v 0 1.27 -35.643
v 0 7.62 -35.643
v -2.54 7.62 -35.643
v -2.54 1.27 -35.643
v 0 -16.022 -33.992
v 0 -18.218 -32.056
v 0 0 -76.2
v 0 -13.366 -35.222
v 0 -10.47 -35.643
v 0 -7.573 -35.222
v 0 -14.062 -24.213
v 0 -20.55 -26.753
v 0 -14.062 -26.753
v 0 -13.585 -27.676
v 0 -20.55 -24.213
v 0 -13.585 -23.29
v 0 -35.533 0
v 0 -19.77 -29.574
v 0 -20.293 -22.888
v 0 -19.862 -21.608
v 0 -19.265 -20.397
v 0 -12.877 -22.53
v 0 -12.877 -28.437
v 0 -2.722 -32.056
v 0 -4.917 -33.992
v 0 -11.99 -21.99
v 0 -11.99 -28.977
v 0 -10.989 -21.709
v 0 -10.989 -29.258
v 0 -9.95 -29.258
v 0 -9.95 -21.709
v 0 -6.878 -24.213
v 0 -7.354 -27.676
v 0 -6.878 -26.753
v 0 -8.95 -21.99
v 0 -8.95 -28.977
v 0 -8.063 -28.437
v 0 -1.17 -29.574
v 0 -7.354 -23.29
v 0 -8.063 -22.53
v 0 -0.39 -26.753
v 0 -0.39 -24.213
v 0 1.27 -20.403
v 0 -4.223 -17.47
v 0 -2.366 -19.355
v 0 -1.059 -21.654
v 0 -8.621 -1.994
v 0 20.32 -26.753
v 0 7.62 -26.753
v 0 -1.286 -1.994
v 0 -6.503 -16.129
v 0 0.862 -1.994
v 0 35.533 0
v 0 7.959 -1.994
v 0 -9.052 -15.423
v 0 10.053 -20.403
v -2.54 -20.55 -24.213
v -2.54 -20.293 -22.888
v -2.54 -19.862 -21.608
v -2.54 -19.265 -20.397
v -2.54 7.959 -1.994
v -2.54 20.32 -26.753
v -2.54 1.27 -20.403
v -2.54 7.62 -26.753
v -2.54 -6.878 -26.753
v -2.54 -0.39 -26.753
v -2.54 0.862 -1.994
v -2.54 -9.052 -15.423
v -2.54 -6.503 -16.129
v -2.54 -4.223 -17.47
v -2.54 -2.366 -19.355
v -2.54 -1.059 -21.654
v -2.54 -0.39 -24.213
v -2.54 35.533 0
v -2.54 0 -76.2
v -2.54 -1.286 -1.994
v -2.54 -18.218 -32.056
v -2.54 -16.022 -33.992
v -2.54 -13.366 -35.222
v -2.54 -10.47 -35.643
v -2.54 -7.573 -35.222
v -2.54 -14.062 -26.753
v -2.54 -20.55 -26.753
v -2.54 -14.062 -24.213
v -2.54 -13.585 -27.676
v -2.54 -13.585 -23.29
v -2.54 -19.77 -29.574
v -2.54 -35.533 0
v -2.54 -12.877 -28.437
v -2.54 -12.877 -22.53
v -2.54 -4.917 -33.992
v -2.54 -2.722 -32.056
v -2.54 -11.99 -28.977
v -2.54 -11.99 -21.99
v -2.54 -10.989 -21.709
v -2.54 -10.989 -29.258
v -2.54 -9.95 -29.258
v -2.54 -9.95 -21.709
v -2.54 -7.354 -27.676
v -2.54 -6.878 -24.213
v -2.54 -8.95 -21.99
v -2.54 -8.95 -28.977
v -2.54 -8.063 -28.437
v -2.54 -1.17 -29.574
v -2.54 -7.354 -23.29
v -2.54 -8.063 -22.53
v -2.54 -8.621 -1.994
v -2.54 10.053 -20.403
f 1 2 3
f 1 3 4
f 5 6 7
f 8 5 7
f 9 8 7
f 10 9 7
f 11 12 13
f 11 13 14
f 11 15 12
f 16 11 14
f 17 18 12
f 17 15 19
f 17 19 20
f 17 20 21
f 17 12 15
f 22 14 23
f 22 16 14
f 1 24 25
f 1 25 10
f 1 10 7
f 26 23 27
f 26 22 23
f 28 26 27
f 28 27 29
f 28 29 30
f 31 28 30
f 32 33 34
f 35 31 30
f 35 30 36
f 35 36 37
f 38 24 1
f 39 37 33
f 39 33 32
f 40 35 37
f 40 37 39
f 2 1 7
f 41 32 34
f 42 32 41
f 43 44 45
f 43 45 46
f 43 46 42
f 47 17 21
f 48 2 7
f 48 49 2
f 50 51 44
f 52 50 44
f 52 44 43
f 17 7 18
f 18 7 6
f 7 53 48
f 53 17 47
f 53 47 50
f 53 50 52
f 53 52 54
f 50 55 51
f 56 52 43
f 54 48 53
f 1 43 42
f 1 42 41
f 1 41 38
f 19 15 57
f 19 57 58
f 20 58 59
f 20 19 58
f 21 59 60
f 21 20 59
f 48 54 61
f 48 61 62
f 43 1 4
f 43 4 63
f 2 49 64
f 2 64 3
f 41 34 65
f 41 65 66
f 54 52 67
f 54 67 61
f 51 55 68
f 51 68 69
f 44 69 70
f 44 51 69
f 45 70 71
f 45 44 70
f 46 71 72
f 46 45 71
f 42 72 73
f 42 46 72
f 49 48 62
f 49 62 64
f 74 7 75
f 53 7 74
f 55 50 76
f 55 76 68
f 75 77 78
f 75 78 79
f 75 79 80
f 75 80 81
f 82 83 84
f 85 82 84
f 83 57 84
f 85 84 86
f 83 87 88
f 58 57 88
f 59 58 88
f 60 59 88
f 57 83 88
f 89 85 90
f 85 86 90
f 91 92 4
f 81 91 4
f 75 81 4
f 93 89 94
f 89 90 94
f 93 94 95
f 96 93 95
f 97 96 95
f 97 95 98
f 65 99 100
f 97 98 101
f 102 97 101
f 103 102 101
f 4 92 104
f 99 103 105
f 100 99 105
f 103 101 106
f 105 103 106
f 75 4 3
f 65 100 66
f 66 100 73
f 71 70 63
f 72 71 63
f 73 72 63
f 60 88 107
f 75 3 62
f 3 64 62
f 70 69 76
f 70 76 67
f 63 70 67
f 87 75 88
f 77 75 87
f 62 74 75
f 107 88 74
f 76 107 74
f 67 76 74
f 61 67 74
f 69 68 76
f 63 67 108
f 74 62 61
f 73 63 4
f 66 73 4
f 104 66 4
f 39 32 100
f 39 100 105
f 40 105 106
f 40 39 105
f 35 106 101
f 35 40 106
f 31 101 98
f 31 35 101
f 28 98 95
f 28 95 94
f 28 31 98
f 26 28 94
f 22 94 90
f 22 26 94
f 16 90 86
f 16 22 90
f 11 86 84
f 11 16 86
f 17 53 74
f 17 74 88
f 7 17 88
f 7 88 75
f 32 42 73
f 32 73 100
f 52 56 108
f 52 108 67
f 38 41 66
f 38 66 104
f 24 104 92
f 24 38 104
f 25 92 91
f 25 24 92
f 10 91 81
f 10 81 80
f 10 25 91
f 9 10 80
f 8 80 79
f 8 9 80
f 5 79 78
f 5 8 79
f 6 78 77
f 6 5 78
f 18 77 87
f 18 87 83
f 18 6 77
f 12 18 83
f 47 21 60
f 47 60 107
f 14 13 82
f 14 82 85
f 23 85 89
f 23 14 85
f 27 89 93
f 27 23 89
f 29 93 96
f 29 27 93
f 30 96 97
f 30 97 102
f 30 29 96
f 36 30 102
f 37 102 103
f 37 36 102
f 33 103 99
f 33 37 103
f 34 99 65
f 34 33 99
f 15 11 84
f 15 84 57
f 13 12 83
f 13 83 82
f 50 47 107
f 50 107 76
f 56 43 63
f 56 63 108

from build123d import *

# Parameters (mm, degrees)
F1_DEPTH = 2.54


with BuildPart() as f1:
    # F0 (on Right) → F1 (new body)
    with BuildSketch(Plane.YZ):
        Polygon((0, 0), (-35.532644, 0), (0, -76.2), align=None)
        with BuildLine():
            Line((-20.550144, -26.753266), (-14.061934, -26.753266))
            ThreePointArc((-14.061934, -26.753266), (-10.469832, -29.293266), (-6.877729, -26.753266))
            Line((-6.877729, -26.753266), (-0.389519, -26.753266))
            ThreePointArc((-0.389519, -26.753266), (-10.469832, -35.643266), (-20.550144, -26.753266))
        make_face(mode=Mode.SUBTRACT)
        with BuildLine():
            Line((-19.264794, -20.396594), (-8.621269, -1.993714))
            Line((-8.621269, -1.993714), (-1.285707, -1.993714))
            Line((-1.285707, -1.993714), (-9.052472, -15.422615))
            ThreePointArc((-9.052472, -15.422615), (-3.233258, -18.351814), (-0.389519, -24.213266))
            Line((-0.389519, -24.213266), (-6.877729, -24.213266))
            ThreePointArc((-6.877729, -24.213266), (-10.469832, -21.673266), (-14.061934, -24.213266))
            Line((-14.061934, -24.213266), (-20.550144, -24.213266))
            ThreePointArc((-20.550144, -24.213266), (-20.098474, -22.240605), (-19.264794, -20.396594))
        make_face(mode=Mode.SUBTRACT)
        Polygon((35.532644, 0), (0, 0), (0, -76.2), align=None)
        Polygon((0.862135, -1.993714), (7.959447, -1.993714), (20.32, -26.753266), (7.62, -26.753266), (7.62, -35.643266), (1.27, -35.643266), (1.27, -20.403266), (10.052618, -20.403266), align=None, mode=Mode.SUBTRACT)
    extrude(amount=-F1_DEPTH)


solid = f1.part
